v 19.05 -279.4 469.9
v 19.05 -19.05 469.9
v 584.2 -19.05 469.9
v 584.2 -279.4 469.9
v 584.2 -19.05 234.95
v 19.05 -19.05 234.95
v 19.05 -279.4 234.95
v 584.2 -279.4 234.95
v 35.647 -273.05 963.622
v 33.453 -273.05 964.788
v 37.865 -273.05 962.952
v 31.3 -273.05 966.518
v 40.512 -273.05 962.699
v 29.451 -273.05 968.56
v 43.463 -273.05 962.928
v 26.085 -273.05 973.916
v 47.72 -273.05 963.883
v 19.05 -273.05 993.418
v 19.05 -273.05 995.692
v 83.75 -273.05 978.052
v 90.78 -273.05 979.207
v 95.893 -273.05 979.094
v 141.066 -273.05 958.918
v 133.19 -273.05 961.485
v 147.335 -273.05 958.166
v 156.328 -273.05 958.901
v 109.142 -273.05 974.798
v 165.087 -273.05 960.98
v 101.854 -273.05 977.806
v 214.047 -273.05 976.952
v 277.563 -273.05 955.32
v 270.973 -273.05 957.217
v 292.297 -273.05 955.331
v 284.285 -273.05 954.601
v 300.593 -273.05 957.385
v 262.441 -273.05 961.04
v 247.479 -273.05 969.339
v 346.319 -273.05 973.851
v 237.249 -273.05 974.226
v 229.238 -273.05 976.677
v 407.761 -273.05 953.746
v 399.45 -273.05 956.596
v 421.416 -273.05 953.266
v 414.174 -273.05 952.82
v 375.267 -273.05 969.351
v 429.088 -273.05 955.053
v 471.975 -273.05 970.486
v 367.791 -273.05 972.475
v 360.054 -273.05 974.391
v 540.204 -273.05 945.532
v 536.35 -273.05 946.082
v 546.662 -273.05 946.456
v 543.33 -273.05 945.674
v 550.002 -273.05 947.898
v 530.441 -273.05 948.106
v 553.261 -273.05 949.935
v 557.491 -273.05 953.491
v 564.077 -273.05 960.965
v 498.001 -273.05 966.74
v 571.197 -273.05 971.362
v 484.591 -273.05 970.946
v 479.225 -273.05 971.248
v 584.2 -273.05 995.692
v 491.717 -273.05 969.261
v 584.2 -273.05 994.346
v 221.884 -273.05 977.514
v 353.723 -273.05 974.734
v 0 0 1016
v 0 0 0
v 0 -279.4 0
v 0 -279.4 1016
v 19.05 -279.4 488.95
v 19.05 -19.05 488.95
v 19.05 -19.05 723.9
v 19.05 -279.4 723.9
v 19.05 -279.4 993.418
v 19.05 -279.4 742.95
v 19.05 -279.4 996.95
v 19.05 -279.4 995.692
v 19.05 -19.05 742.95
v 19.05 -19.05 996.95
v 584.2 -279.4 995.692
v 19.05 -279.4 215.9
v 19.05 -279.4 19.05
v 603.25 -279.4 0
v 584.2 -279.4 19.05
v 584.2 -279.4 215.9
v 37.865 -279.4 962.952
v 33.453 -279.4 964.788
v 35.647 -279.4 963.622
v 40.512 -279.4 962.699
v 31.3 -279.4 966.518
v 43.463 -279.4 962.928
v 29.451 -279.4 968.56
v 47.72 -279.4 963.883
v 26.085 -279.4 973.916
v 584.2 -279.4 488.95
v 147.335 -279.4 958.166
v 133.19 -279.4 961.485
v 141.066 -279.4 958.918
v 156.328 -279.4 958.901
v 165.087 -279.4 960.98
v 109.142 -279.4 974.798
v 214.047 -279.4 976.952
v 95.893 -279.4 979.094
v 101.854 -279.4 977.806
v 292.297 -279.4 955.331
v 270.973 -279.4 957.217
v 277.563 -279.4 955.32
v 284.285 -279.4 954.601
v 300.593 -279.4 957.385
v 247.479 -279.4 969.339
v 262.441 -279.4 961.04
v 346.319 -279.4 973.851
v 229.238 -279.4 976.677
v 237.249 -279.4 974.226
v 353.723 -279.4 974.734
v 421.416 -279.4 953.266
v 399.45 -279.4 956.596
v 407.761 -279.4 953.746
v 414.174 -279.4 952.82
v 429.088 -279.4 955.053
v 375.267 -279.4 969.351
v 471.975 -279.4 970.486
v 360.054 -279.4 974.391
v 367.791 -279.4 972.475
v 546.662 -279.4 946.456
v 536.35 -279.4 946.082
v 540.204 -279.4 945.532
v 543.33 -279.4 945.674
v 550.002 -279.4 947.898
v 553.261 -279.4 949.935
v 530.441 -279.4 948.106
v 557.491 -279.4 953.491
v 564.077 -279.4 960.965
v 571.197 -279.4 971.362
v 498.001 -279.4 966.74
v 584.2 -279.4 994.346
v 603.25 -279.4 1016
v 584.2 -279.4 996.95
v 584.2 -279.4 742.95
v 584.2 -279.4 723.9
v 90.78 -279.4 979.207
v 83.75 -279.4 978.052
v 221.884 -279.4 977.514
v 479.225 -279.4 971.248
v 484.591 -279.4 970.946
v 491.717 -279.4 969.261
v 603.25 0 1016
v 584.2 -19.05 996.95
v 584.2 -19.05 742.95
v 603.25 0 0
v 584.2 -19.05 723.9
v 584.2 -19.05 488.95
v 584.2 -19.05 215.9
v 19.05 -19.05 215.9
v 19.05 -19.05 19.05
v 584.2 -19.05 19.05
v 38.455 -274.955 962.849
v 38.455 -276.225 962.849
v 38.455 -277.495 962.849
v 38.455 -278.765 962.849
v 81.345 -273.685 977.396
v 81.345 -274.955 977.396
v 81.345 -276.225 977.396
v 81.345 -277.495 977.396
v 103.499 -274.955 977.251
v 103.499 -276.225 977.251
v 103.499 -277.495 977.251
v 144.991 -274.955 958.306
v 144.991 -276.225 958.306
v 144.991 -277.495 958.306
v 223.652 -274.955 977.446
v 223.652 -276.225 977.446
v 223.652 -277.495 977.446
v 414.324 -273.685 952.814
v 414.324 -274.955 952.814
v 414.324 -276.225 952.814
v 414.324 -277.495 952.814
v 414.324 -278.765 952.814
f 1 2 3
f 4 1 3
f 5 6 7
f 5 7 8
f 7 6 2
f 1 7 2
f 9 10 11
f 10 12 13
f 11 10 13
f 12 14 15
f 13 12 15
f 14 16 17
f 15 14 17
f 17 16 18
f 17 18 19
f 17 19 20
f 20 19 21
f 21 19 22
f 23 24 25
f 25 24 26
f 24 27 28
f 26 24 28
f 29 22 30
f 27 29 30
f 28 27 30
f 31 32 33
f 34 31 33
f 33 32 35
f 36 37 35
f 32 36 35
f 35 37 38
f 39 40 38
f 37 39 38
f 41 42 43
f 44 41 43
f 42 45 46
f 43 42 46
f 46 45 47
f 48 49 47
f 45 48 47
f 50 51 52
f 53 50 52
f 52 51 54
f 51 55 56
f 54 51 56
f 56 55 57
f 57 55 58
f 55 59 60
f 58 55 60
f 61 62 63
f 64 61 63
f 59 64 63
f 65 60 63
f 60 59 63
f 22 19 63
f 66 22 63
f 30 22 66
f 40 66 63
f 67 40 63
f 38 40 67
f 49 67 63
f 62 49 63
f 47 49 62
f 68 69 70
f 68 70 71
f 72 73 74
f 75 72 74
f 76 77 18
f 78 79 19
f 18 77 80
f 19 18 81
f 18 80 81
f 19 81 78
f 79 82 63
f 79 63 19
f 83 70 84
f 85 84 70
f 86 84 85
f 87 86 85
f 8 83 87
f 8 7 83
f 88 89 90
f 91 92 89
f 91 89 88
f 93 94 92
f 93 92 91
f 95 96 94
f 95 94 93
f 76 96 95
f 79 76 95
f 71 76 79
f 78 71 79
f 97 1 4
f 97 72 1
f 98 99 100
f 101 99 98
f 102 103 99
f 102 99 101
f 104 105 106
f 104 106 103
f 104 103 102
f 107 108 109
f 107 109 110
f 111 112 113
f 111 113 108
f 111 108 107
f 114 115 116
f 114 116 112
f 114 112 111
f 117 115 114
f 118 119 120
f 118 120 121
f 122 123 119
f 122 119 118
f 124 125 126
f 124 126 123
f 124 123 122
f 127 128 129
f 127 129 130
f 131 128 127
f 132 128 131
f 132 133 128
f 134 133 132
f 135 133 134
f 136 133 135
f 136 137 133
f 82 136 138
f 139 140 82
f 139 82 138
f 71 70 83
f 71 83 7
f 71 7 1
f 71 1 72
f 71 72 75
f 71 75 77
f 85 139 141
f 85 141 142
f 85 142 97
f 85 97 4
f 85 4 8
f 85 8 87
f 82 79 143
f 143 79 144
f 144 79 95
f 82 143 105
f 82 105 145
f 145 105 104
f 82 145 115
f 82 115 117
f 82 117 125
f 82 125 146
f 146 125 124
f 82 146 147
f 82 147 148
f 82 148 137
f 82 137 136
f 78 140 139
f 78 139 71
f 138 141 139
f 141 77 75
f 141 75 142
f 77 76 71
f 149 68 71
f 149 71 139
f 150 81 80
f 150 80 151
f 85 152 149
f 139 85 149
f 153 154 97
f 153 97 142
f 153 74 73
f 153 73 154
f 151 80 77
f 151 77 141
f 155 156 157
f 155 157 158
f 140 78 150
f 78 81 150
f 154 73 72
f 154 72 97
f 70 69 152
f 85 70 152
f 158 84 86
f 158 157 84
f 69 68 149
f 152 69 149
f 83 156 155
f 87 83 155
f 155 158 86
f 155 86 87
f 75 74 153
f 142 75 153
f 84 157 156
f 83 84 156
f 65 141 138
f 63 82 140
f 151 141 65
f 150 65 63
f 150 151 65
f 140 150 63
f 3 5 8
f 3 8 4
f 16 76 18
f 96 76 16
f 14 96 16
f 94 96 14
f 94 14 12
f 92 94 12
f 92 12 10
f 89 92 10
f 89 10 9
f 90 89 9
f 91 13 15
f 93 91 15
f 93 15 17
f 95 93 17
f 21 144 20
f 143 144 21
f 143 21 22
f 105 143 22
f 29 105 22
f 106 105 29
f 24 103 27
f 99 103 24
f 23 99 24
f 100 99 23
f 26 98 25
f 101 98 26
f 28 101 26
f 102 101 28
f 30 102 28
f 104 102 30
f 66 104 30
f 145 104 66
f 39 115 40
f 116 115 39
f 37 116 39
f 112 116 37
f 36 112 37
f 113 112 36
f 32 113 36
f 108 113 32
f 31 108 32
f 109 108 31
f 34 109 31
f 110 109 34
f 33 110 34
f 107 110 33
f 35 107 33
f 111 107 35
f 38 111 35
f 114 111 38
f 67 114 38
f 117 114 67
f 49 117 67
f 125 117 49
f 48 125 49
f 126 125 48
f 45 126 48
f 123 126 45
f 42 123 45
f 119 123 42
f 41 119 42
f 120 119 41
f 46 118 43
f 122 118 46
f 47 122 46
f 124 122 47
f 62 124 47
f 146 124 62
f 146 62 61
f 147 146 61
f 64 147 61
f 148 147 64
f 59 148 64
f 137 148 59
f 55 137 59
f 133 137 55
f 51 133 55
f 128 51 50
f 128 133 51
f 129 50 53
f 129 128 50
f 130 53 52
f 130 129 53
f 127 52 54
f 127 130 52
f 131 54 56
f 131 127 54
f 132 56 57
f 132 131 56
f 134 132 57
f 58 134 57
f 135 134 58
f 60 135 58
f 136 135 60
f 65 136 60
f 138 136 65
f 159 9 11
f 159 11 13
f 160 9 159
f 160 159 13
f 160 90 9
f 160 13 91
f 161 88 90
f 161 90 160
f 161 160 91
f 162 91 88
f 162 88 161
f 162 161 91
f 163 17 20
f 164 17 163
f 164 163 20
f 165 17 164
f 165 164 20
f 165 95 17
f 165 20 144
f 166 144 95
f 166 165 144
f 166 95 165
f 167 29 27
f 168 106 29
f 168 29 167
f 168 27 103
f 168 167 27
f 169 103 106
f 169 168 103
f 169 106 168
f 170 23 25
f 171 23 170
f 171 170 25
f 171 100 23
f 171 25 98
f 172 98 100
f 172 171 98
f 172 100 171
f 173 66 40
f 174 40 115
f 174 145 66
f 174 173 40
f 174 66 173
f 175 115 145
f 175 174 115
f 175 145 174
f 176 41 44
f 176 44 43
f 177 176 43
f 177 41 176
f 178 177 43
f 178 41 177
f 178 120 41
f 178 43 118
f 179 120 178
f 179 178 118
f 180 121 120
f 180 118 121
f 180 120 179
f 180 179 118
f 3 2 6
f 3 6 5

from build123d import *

# Parameters (mm, degrees)
F0_W     = 603.25
F0_H     = 1016
F1_DEPTH = 279.4
F2_T     = -19.05
F3_W     = 565.15
F3_H     = 19.05
F4_DEPTH = 260.35
F7_DEPTH = 6.35


with BuildPart() as f1:
    # F0 (on Front) → F1 (new body)
    with BuildSketch(Plane.XZ):
        with Locations((301.625, 508)):
            Rectangle(F0_W, F0_H)
    extrude(amount=F1_DEPTH)

    # F2
    f2_openings = [f1.faces().sort_by_distance(p)[0] for p in [
        (301.625, -279.4, 508),
    ]]
    offset(amount=F2_T, openings=f2_openings)

    # F3 (on face) → F4 (join)
    with BuildSketch(Plane.XZ.offset(19.05)):
        with Locations((301.625, 733.425)):
            Rectangle(F3_W, F3_H)
        with Locations((301.625, 479.425)):
            Rectangle(F3_W, F3_H)
        with Locations((301.625, 225.425)):
            Rectangle(F3_W, F3_H)
    extrude(amount=F4_DEPTH)

    # F6 (on offset) → F7 (join)
    with BuildSketch(Plane.XZ.offset(279.4)):
        with BuildLine():
            Line((584.9241614342, 995.6918358803), (18.3840543032, 995.6918358803))
            add(Edge.make_bspline(
                [(18.3840543032, 995.6918358803), (22.9446869058, 980.0916117955), (33.0624707567, 945.4824448069), (97.236484595, 998.1157284181), (142.859921271, 937.2559631762), (226.45959666, 999.1572020464), (280.4673534763, 933.1713283742), (358.7241351901, 995.9649768258), (412.6649530689, 931.9899288239), (484.1480210672, 993.7111371243), (544.9316035358, 921.3338875252), (571.4668463845, 970.670722202), (584.9241614342, 995.6918358803)],
                knots=[0, 0, 0, 0, 0.0781743177, 0.1734300738, 0.2677871456, 0.3810262648, 0.4814634402, 0.5917262865, 0.6905457485, 0.7972387084, 0.8971698659, 1, 1, 1, 1], degree=3))
        make_face()
    extrude(amount=-F7_DEPTH)


solid = f1.part
